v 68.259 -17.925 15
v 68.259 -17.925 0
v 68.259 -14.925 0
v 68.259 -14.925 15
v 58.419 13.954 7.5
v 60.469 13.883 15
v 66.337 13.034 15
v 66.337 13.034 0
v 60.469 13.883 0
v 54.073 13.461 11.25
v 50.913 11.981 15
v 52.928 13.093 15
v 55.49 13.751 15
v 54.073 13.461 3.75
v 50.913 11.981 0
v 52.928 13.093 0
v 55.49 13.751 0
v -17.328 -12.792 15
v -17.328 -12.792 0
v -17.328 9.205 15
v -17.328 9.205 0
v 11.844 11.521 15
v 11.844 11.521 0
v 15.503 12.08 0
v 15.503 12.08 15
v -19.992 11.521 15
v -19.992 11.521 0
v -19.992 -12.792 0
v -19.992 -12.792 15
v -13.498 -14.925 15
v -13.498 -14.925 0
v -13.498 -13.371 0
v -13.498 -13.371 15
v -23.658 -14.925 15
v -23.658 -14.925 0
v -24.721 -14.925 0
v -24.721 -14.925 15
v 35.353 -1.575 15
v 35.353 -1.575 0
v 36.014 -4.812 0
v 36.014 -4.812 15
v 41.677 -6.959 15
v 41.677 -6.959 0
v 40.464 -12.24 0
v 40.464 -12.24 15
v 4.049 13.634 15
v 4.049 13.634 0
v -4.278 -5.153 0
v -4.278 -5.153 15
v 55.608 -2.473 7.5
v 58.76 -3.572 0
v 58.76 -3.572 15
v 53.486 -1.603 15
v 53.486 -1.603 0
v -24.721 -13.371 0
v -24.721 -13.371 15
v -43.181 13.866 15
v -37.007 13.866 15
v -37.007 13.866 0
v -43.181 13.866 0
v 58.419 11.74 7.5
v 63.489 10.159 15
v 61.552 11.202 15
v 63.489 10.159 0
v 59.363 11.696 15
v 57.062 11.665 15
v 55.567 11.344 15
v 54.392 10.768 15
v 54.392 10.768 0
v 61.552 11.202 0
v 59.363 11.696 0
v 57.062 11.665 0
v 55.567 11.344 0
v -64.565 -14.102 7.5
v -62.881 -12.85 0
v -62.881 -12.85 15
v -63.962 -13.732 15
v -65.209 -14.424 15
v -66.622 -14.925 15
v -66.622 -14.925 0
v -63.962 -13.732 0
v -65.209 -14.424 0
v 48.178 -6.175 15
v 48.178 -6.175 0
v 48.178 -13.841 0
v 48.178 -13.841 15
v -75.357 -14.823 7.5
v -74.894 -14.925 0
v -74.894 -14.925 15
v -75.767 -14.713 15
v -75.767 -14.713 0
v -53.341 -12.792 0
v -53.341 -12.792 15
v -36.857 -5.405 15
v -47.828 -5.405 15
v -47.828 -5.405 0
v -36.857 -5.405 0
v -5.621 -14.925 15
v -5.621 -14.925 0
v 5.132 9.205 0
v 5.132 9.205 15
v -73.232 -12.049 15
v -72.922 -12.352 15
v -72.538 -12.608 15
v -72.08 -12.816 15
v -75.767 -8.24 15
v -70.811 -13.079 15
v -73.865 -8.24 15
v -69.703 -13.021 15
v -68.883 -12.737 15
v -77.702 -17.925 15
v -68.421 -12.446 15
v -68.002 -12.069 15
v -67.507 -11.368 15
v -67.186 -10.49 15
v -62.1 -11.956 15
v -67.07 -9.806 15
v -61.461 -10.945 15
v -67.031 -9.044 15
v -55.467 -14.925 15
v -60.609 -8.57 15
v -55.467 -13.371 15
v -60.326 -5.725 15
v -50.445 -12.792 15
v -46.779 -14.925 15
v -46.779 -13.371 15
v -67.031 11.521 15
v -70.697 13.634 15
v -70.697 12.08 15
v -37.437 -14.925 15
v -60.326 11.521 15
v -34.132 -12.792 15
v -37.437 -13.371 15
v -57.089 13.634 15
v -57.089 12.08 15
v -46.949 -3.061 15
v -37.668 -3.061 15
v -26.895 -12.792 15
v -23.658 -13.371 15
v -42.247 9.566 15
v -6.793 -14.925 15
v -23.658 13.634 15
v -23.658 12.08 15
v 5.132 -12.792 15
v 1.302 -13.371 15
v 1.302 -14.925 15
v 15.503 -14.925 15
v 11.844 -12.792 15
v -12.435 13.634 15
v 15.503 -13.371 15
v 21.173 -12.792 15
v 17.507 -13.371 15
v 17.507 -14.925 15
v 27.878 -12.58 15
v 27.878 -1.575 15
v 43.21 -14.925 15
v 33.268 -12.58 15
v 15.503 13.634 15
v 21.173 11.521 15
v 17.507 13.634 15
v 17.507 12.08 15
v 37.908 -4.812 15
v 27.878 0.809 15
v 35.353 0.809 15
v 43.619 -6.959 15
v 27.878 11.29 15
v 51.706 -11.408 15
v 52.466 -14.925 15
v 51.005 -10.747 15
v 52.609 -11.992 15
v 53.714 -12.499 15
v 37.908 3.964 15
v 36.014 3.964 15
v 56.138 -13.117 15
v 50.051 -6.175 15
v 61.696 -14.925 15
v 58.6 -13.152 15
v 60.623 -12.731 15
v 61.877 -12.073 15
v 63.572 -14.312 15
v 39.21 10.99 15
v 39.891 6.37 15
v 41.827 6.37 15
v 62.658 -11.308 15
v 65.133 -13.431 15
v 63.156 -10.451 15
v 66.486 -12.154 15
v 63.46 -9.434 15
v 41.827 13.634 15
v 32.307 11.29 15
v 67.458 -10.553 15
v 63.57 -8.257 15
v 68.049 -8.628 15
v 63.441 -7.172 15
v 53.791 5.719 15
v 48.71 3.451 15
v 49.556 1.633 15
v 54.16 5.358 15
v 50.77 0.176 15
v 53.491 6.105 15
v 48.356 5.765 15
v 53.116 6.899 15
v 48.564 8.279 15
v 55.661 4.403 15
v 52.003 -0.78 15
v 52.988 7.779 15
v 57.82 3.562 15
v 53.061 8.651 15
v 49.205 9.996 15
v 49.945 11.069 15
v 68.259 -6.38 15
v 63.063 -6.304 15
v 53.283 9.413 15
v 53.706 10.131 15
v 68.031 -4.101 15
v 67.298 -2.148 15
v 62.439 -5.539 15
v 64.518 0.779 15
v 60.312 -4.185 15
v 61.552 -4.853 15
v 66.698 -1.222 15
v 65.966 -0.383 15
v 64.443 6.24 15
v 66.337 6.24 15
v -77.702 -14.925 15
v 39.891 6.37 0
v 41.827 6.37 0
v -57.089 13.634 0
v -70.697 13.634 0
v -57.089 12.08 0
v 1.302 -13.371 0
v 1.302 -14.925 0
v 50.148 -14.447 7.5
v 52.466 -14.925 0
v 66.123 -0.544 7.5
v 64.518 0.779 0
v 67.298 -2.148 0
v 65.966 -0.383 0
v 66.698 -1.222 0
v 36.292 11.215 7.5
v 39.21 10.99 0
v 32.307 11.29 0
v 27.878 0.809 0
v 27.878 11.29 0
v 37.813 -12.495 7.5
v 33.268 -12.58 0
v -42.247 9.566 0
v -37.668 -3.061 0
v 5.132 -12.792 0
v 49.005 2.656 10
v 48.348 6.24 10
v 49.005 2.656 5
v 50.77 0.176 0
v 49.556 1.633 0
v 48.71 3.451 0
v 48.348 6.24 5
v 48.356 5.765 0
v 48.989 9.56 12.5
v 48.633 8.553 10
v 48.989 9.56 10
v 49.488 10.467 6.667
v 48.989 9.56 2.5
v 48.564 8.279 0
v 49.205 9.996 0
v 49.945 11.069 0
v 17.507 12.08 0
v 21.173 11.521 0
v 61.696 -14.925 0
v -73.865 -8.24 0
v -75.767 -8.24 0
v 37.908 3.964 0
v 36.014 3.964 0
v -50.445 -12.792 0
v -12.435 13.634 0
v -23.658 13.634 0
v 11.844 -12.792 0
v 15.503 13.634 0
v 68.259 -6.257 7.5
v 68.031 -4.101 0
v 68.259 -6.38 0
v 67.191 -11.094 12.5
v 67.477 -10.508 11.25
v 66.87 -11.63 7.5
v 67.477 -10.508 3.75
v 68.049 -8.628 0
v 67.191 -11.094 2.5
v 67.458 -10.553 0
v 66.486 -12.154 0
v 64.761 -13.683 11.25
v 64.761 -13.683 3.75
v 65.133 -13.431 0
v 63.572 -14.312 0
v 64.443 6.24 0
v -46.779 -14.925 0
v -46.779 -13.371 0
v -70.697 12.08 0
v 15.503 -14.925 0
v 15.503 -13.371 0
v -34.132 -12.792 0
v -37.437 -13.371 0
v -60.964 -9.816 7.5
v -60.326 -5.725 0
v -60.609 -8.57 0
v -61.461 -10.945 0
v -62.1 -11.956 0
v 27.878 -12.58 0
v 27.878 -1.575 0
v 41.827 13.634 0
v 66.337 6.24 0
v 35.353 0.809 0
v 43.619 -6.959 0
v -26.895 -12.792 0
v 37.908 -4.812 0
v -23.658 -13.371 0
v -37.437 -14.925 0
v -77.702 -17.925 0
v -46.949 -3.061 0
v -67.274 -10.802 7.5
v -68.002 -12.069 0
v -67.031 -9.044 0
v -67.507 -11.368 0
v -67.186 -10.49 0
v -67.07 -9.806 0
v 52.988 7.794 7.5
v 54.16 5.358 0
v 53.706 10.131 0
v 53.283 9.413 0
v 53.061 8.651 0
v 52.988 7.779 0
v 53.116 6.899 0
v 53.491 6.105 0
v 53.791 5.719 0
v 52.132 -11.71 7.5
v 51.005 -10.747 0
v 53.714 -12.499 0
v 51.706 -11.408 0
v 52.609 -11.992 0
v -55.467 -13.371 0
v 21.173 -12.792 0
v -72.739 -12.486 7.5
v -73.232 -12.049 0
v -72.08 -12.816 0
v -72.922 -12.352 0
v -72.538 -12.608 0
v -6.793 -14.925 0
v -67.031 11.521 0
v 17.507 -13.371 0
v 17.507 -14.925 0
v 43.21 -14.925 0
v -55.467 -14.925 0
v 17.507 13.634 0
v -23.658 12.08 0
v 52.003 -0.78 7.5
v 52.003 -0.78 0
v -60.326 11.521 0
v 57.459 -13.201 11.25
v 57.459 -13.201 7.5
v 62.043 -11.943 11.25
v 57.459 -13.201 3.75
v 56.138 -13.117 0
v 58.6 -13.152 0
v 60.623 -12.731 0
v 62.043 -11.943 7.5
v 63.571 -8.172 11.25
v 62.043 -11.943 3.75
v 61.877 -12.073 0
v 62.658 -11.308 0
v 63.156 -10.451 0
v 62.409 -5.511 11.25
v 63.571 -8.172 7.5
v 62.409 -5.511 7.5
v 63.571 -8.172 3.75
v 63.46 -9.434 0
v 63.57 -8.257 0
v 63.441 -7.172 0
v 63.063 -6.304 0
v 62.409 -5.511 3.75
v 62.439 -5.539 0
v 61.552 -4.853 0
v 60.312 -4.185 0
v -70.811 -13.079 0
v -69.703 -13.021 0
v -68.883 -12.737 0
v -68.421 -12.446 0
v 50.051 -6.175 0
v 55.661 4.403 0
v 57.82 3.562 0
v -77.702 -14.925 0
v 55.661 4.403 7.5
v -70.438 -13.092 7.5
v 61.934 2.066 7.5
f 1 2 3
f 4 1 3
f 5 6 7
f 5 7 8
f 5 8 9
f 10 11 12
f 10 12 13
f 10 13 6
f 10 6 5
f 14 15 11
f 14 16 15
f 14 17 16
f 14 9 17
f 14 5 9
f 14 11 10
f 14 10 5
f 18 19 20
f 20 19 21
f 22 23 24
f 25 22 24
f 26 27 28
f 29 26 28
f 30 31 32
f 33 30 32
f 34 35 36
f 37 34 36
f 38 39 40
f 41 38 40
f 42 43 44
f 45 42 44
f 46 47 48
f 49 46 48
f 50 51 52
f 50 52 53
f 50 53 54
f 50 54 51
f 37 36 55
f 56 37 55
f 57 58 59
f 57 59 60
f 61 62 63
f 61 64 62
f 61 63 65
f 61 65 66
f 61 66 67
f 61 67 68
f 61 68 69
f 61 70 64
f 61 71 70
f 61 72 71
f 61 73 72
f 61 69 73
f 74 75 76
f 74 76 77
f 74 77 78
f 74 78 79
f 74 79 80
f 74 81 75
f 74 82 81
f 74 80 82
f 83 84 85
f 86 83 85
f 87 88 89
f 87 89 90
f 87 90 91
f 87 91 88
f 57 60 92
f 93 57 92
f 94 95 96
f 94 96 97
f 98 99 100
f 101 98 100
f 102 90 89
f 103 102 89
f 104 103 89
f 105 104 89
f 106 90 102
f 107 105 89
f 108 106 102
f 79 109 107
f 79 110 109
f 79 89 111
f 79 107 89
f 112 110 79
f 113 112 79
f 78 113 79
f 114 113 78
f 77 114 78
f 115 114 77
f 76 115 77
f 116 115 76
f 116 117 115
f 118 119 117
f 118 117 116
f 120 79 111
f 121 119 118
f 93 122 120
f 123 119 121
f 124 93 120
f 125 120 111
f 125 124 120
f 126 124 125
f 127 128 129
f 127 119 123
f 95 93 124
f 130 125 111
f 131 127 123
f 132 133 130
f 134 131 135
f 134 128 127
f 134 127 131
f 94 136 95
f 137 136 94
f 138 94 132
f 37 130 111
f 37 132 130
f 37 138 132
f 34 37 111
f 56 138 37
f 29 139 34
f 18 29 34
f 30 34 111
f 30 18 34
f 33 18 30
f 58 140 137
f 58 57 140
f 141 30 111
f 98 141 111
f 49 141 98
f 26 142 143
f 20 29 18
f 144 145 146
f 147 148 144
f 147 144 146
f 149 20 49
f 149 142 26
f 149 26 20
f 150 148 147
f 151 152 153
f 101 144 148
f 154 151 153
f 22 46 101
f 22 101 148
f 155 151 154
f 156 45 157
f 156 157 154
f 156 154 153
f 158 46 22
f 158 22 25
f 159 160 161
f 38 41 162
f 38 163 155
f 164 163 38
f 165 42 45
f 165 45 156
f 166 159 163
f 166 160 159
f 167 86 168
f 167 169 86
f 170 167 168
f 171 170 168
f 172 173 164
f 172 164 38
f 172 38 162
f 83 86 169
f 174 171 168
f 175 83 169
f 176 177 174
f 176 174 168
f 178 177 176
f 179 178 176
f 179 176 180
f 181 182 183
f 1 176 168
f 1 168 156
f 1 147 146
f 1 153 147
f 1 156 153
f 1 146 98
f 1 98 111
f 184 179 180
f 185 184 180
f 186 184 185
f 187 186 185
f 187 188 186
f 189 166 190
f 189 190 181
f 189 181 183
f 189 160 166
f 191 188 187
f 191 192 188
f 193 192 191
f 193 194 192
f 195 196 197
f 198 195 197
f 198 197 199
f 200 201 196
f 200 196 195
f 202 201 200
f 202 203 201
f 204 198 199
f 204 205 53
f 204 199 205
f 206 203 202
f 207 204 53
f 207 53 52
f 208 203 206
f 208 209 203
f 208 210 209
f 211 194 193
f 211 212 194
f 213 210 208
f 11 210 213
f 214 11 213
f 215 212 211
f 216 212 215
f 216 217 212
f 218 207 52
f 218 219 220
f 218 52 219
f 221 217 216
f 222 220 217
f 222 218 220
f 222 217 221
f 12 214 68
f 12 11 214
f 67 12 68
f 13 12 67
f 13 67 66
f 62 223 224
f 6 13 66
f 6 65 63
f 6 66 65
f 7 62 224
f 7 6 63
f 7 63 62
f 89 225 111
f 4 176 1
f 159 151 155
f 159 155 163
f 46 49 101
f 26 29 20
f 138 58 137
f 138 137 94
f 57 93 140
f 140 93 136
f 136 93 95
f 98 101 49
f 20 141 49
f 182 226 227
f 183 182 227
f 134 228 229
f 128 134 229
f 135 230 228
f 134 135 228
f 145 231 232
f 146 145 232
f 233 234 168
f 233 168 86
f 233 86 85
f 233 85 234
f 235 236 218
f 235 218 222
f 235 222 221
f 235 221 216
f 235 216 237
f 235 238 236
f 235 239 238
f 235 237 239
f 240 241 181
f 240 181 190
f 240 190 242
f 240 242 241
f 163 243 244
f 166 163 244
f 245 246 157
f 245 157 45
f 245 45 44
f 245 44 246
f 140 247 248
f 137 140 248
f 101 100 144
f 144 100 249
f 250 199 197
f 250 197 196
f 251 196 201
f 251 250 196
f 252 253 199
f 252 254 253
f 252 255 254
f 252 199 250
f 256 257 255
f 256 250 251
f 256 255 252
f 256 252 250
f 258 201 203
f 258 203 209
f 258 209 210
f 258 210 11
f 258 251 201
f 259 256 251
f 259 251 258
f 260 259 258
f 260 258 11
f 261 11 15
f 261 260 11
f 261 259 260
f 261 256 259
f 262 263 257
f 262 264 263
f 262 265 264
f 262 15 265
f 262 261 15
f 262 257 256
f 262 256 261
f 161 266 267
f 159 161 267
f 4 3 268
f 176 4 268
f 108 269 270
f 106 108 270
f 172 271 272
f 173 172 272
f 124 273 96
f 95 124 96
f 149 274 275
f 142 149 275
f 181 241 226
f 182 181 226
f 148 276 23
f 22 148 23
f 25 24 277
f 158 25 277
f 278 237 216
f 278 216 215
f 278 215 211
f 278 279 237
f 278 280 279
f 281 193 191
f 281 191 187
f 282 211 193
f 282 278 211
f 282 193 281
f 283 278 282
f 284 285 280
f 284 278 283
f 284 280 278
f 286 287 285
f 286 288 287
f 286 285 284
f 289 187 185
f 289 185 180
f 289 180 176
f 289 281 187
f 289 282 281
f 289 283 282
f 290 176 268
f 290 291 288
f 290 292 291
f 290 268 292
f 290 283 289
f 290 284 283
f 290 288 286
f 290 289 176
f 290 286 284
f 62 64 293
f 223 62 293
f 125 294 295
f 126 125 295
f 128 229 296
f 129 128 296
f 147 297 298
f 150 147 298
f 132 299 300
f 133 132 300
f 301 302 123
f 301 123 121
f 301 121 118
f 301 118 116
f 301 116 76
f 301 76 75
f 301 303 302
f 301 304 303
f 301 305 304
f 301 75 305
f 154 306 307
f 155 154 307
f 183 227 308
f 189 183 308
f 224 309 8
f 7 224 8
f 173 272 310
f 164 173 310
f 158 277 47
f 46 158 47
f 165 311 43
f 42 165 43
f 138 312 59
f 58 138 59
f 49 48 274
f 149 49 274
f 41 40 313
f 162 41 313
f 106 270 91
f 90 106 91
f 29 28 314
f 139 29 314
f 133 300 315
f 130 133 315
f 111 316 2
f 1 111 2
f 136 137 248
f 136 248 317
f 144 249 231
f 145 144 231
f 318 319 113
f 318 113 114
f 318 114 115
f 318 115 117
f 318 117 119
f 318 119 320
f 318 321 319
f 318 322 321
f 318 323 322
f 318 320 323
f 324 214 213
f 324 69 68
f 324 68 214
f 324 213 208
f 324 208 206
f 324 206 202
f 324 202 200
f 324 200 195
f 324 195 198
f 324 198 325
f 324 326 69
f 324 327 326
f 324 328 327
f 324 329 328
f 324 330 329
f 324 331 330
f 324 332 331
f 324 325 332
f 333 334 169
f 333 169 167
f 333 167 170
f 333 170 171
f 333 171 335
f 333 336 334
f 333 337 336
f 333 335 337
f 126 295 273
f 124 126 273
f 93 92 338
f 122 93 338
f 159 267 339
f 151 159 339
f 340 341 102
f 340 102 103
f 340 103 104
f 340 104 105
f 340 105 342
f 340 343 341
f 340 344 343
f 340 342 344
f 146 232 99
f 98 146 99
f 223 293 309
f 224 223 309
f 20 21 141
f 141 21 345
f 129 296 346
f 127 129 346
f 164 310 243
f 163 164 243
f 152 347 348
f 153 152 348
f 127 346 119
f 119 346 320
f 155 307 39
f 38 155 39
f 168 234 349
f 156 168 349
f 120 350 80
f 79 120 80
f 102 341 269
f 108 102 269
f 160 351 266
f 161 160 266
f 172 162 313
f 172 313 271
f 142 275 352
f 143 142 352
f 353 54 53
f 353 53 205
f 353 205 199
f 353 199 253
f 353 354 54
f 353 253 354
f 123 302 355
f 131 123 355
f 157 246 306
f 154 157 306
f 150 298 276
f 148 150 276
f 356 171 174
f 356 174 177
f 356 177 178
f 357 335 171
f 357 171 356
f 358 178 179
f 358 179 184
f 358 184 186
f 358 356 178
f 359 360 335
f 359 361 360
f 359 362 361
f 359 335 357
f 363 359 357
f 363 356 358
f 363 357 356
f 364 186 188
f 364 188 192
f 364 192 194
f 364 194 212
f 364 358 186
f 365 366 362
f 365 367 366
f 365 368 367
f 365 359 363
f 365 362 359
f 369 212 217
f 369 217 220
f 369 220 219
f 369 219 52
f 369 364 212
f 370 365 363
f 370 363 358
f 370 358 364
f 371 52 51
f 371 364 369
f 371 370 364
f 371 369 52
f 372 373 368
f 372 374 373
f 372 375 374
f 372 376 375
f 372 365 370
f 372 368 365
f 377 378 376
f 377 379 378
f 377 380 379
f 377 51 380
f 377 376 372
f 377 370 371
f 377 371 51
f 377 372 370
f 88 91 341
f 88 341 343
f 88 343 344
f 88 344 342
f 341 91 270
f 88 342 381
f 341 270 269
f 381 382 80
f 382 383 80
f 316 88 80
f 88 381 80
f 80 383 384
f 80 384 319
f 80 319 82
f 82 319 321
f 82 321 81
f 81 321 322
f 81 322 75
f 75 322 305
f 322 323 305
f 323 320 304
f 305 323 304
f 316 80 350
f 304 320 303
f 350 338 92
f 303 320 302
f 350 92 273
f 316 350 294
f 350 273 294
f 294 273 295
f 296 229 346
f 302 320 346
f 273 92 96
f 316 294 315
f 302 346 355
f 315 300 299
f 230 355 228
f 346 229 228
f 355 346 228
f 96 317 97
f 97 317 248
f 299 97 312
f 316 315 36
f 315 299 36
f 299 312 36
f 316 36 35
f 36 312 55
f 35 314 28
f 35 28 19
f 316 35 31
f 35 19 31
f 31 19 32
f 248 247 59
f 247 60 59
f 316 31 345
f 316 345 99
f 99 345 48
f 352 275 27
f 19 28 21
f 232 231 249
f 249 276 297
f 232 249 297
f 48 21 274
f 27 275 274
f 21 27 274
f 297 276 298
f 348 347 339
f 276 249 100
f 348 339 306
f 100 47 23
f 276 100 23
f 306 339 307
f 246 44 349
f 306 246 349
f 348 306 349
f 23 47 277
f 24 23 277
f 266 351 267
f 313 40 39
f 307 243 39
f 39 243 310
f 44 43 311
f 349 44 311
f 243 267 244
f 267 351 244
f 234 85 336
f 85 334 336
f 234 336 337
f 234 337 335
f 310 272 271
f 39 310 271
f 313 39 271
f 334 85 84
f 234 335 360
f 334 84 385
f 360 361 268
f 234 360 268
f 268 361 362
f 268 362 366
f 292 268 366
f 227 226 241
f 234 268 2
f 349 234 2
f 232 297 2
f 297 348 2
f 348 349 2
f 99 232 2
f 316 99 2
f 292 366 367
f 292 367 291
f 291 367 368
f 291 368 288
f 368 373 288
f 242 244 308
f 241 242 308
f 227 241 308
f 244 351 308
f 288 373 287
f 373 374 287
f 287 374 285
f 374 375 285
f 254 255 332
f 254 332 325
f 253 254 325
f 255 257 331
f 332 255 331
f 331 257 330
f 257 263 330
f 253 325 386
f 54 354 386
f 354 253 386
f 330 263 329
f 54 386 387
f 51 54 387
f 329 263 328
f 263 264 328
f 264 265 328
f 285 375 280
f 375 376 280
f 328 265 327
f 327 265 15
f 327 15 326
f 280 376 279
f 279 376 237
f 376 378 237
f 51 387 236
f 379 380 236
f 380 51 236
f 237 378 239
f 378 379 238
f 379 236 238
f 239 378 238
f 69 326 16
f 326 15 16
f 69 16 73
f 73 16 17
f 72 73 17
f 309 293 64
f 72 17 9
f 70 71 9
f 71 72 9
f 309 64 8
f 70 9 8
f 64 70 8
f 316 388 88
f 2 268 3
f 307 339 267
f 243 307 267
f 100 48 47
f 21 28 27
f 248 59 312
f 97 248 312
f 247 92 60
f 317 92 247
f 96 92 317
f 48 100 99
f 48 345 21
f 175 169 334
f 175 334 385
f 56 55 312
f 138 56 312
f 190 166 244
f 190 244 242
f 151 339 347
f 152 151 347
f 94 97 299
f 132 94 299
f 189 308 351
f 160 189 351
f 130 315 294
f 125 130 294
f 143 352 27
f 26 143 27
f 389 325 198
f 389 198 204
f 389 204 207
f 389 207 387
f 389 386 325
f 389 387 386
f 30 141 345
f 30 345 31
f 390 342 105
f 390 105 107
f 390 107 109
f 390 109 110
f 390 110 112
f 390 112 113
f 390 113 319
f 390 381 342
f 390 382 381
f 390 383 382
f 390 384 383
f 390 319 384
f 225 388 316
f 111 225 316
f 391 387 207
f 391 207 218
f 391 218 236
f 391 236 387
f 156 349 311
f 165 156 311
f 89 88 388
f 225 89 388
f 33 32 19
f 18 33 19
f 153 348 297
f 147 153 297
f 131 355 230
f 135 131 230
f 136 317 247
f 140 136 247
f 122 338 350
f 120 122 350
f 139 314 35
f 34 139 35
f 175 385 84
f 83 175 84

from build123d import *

# Parameters (mm, degrees)
F1_DEPTH = 15


with BuildPart() as f1:
    # F0 (on Top) → F1 (new body)
    with BuildSketch(Plane.XY):
        Polygon((-55.4669993083, -13.3709355081), (-55.4669993083, -14.9245814085), (-46.7788478918, -14.9245814085), (-46.7788478918, -13.3709355081), (-50.4449070777, -12.7917254137), (-47.8282402981, -5.4050931505), (-36.8573196859, -5.4050931505), (-34.1316251238, -12.7917254137), (-37.4365297803, -13.3709355081), (-37.4365297803, -14.9245814085), (-24.7211646484, -14.9245814085), (-24.7211646484, -13.3709355081), (-26.8949060616, -12.7917254137), (-37.0072328868, 13.8655674032), (-43.1809310698, 13.8655674032), (-53.3409575499, -12.7917254137), align=None)
        Polygon((-46.9492038019, -3.0609958272), (-42.2473806823, 9.5657842315), (-37.6682138181, -3.0609958272), align=None, mode=Mode.SUBTRACT)
        with BuildLine():
            Line((-46.7788478918, -14.9245814085), (-55.4669993083, -14.9245814085))
            Line((-55.4669993083, -14.9245814085), (-66.6218982829, -14.9245814085))
            add(Edge.make_bspline(
                [(-66.6218982829, -14.9245814085), (-68.2072820659, -15.353878302), (-70.1653072341, -15.353878302)],
                knots=[0.5859606644, 0.5859606644, 0.5859606644, 1, 1, 1], degree=2))
            add(Edge.make_bspline(
                [(-70.1653072341, -15.353878302), (-71.7598385529, -15.353878302), (-73.3032630987, -15.1698939191)],
                knots=[0, 0, 0, 1, 1, 1], degree=2))
            add(Edge.make_bspline(
                [(-73.3032630987, -15.1698939191), (-74.2052983154, -15.0623665423), (-74.8943654736, -14.9245814085)],
                knots=[0, 0, 0, 0.5844375218, 0.5844375218, 0.5844375218], degree=2))
            Line((-74.8943654736, -14.9245814085), (-77.7018526982, -14.9245814085))
            Line((-77.7018526982, -14.9245814085), (-77.7018526982, -17.9245814085))
            Line((-77.7018526982, -17.9245814085), (68.2590910996, -17.9245814085))
            Line((68.2590910996, -17.9245814085), (68.2590910996, -14.9245814085))
            Line((68.2590910996, -14.9245814085), (61.695634433, -14.9245814085))
            add(Edge.make_bspline(
                [(61.695634433, -14.9245814085), (59.8741275274, -15.353878302), (57.5471114707, -15.353878302)],
                knots=[0.7827650782, 0.7827650782, 0.7827650782, 1, 1, 1], degree=2))
            add(Edge.make_bspline(
                [(57.5471114707, -15.353878302), (55.0939863649, -15.353878302), (52.5488690676, -14.9382098813)],
                knots=[0, 0, 0, 1, 1, 1], degree=2))
            add(Edge.make_bspline(
                [(52.5488690676, -14.9382098813), (52.5073622228, -14.9314309856), (52.4660465805, -14.9245814085)],
                knots=[0, 0, 0, 0.0163084212, 0.0163084212, 0.0163084212], degree=2))
            Line((52.4660465805, -14.9245814085), (43.2099580743, -14.9245814085))
            Line((43.2099580743, -14.9245814085), (17.5066583542, -14.9245814085))
            Line((17.5066583542, -14.9245814085), (15.5032728511, -14.9245814085))
            Line((15.5032728511, -14.9245814085), (1.3024041828, -14.9245814085))
            Line((1.3024041828, -14.9245814085), (-5.6208600048, -14.9245814085))
            Line((-5.6208600048, -14.9245814085), (-6.7929086665, -14.9245814085))
            Line((-6.7929086665, -14.9245814085), (-13.4981172891, -14.9245814085))
            Line((-13.4981172891, -14.9245814085), (-23.6581437692, -14.9245814085))
            Line((-23.6581437692, -14.9245814085), (-24.7211646484, -14.9245814085))
            Line((-24.7211646484, -14.9245814085), (-37.4365297803, -14.9245814085))
            Line((-37.4365297803, -14.9245814085), (-46.7788478918, -14.9245814085))
        make_face()
        with BuildLine():
            add(Edge.make_bspline(
                [(-66.6218982829, -14.9245814085), (-68.2072820659, -15.353878302), (-70.1653072341, -15.353878302)],
                knots=[0.5859606644, 0.5859606644, 0.5859606644, 1, 1, 1], degree=2))
            Line((-66.6218982829, -14.9245814085), (-74.8943654736, -14.9245814085))
            add(Edge.make_bspline(
                [(-73.3032630987, -15.1698939191), (-74.2052983154, -15.0623665423), (-74.8943654736, -14.9245814085)],
                knots=[0, 0, 0, 0.5844375218, 0.5844375218, 0.5844375218], degree=2))
            add(Edge.make_bspline(
                [(-70.1653072341, -15.353878302), (-71.7598385529, -15.353878302), (-73.3032630987, -15.1698939191)],
                knots=[0, 0, 0, 1, 1, 1], degree=2))
        make_face()
        with BuildLine():
            Line((-74.8943654736, -14.9245814085), (-66.6218982829, -14.9245814085))
            add(Edge.make_bspline(
                [(-62.8808885171, -12.8496464231), (-64.3782164513, -14.3170277987), (-66.6218982829, -14.9245814085)],
                knots=[0, 0, 0, 0.5859606644, 0.5859606644, 0.5859606644], degree=2))
            add(Edge.make_bspline(
                [(-60.3255498651, -5.7253622616), (-60.3255498651, -10.3454145443), (-62.8808885171, -12.8496464231)],
                knots=[0, 0, 0, 1, 1, 1], degree=2))
            Line((-60.3255498651, -5.7253622616), (-60.3255498651, 11.5214700798))
            Line((-60.3255498651, 11.5214700798), (-57.0887875727, 12.080237465))
            Line((-57.0887875727, 12.080237465), (-57.0887875727, 13.6338833654))
            Line((-57.0887875727, 13.6338833654), (-70.6968176737, 13.6338833654))
            Line((-70.6968176737, 13.6338833654), (-70.6968176737, 12.080237465))
            Line((-70.6968176737, 12.080237465), (-67.0307584878, 11.5214700798))
            Line((-67.0307584878, 11.5214700798), (-67.0307584878, -9.0438953909))
            add(Edge.make_bspline(
                [(-68.0017871755, -12.0694163548), (-67.0307584878, -11.047280894), (-67.0307584878, -9.0438953909)],
                knots=[0, 0, 0, 1, 1, 1], degree=2))
            add(Edge.make_bspline(
                [(-70.4378766904, -13.0915518155), (-68.9728158632, -13.0915518155), (-68.0017871755, -12.0694163548)],
                knots=[0, 0, 0, 1, 1, 1], degree=2))
            add(Edge.make_bspline(
                [(-72.080107664, -12.8155752411), (-71.3373558958, -13.0915518155), (-70.4378766904, -13.0915518155)],
                knots=[0, 0, 0, 1, 1, 1], degree=2))
            add(Edge.make_bspline(
                [(-73.2317136165, -12.0489736455), (-72.8228594321, -12.5395986667), (-72.080107664, -12.8155752411)],
                knots=[0, 0, 0, 1, 1, 1], degree=2))
            Line((-73.2317136165, -12.0489736455), (-73.8654376021, -8.2398154951))
            Line((-73.8654376021, -8.2398154951), (-75.7666095592, -8.2398154951))
            Line((-75.7666095592, -8.2398154951), (-75.7666095592, -14.7133400799))
            add(Edge.make_bspline(
                [(-74.8943654736, -14.9245814085), (-75.3843245286, -14.8266097186), (-75.7666095592, -14.7133400799)],
                knots=[0.5844375218, 0.5844375218, 0.5844375218, 1, 1, 1], degree=2))
        make_face()
        Polygon((-23.6581437692, -13.3709355081), (-23.6581437692, -14.9245814085), (-13.4981172891, -14.9245814085), (-13.4981172891, -13.3709355081), (-17.3277181488, -12.7917254137), (-17.3277181488, 9.2046297021), (-6.7929086665, -14.9245814085), (-5.6208600048, -14.9245814085), (5.1320050425, 9.2046297021), (5.1320050425, -12.7917254137), (1.3024041828, -13.3709355081), (1.3024041828, -14.9245814085), (15.5032728511, -14.9245814085), (15.5032728511, -13.3709355081), (11.8440279016, -12.7917254137), (11.8440279016, 11.5214700798), (15.5032728511, 12.080237465), (15.5032728511, 13.6338833654), (4.0485414541, 13.6338833654), (-4.278455433, -5.1529664035), (-12.4350964099, 13.6338833654), (-23.6581437692, 13.6338833654), (-23.6581437692, 12.080237465), (-19.9920845832, 11.5214700798), (-19.9920845832, -12.7917254137), align=None)
        with BuildLine():
            add(Edge.make_bspline(
                [(61.695634433, -14.9245814085), (59.8741275274, -15.353878302), (57.5471114707, -15.353878302)],
                knots=[0.7827650782, 0.7827650782, 0.7827650782, 1, 1, 1], degree=2))
            Line((61.695634433, -14.9245814085), (52.4660465805, -14.9245814085))
            add(Edge.make_bspline(
                [(52.5488690676, -14.9382098813), (52.5073622228, -14.9314309856), (52.4660465805, -14.9245814085)],
                knots=[0, 0, 0, 0.0163084212, 0.0163084212, 0.0163084212], degree=2))
            add(Edge.make_bspline(
                [(57.5471114707, -15.353878302), (55.0939863649, -15.353878302), (52.5488690676, -14.9382098813)],
                knots=[0, 0, 0, 1, 1, 1], degree=2))
        make_face()
        with BuildLine():
            Line((52.4660465805, -14.9245814085), (61.695634433, -14.9245814085))
            add(Edge.make_bspline(
                [(68.2590910996, -6.2568727012), (68.2590910996, -13.377691002), (61.695634433, -14.9245814085)],
                knots=[0, 0, 0, 0.7827650782, 0.7827650782, 0.7827650782], degree=2))
            add(Edge.make_bspline(
                [(67.2982837665, -2.1478881489), (68.2590910996, -3.8923326686), (68.2590910996, -6.2568727012)],
                knots=[0, 0, 0, 1, 1, 1], degree=2))
            add(Edge.make_bspline(
                [(64.5180753132, 0.7788263871), (66.3374764333, -0.4034436292), (67.2982837665, -2.1478881489)],
                knots=[0, 0, 0, 1, 1, 1], degree=2))
            add(Edge.make_bspline(
                [(57.8196809269, 3.5624419586), (62.698674193, 1.9610964034), (64.5180753132, 0.7788263871)],
                knots=[0, 0, 0, 1, 1, 1], degree=2))
            add(Edge.make_bspline(
                [(54.1604359774, 5.3579932514), (55.3324846391, 4.3460791452), (57.8196809269, 3.5624419586)],
                knots=[0, 0, 0, 1, 1, 1], degree=2))
            add(Edge.make_bspline(
                [(52.9883873157, 7.7940827662), (52.9883873157, 6.3699073575), (54.1604359774, 5.3579932514)],
                knots=[0, 0, 0, 1, 1, 1], degree=2))
            add(Edge.make_bspline(
                [(54.3921200152, 10.768496957), (52.9883873157, 9.7974682693), (52.9883873157, 7.7940827662)],
                knots=[0, 0, 0, 1, 1, 1], degree=2))
            add(Edge.make_bspline(
                [(58.4193337306, 11.7395256448), (55.7958527146, 11.7395256448), (54.3921200152, 10.768496957)],
                knots=[0, 0, 0, 1, 1, 1], degree=2))
            add(Edge.make_bspline(
                [(63.489125616, 10.1586227988), (61.3153842028, 11.7395256448), (58.4193337306, 11.7395256448)],
                knots=[0, 0, 0, 1, 1, 1], degree=2))
            Line((63.489125616, 10.1586227988), (64.4431187127, 6.2404368658))
            Line((64.4431187127, 6.2404368658), (66.3374764333, 6.2404368658))
            Line((66.3374764333, 6.2404368658), (66.3374764333, 13.0342305617))
            add(Edge.make_bspline(
                [(58.4193337306, 13.9541524764), (61.9968078433, 13.9541524764), (66.3374764333, 13.0342305617)],
                knots=[0, 0, 0, 1, 1, 1], degree=2))
            add(Edge.make_bspline(
                [(50.9134523303, 11.9814310371), (53.4790123369, 13.9541524764), (58.4193337306, 13.9541524764)],
                knots=[0, 0, 0, 1, 1, 1], degree=2))
            add(Edge.make_bspline(
                [(48.3478923238, 6.2404368658), (48.3478923238, 10.0087095979), (50.9134523303, 11.9814310371)],
                knots=[0, 0, 0, 1, 1, 1], degree=2))
            add(Edge.make_bspline(
                [(49.0054661369, 2.6561485167), (48.3478923238, 4.1143951074), (48.3478923238, 6.2404368658)],
                knots=[0, 0, 0, 1, 1, 1], degree=2))
            add(Edge.make_bspline(
                [(50.7703533658, 0.1757664653), (49.66303995, 1.197901926), (49.0054661369, 2.6561485167)],
                knots=[0, 0, 0, 1, 1, 1], degree=2))
            add(Edge.make_bspline(
                [(53.4858265733, -1.6027492365), (51.8776667817, -0.8463689955), (50.7703533658, 0.1757664653)],
                knots=[0, 0, 0, 1, 1, 1], degree=2))
            add(Edge.make_bspline(
                [(58.7600455508, -3.5720635576), (55.0939863649, -2.3591294774), (53.4858265733, -1.6027492365)],
                knots=[0, 0, 0, 1, 1, 1], degree=2))
            add(Edge.make_bspline(
                [(62.4090691458, -5.5107138148), (61.2472418387, -4.4238431082), (58.7600455508, -3.5720635576)],
                knots=[0, 0, 0, 1, 1, 1], degree=2))
            add(Edge.make_bspline(
                [(63.5708964529, -8.171673131), (63.5708964529, -6.5975845214), (62.4090691458, -5.5107138148)],
                knots=[0, 0, 0, 1, 1, 1], degree=2))
            add(Edge.make_bspline(
                [(57.4585263975, -13.200579598), (63.5708964529, -13.200579598), (63.5708964529, -8.171673131)],
                knots=[0, 0, 0, 1, 1, 1], degree=2))
            add(Edge.make_bspline(
                [(53.7141034929, -12.4987132483), (55.5232832584, -13.200579598), (57.4585263975, -13.200579598)],
                knots=[0, 0, 0, 1, 1, 1], degree=2))
            add(Edge.make_bspline(
                [(51.0054445218, -10.7474544922), (51.9049237273, -11.7968468985), (53.7141034929, -12.4987132483)],
                knots=[0, 0, 0, 1, 1, 1], degree=2))
            Line((51.0054445218, -10.7474544922), (50.0514514251, -6.1751018643))
            Line((50.0514514251, -6.1751018643), (48.1775364137, -6.1751018643))
            Line((48.1775364137, -6.1751018643), (48.1775364137, -13.8411178201))
            add(Edge.make_bspline(
                [(52.4660465805, -14.9245814085), (49.9739690811, -14.5114285169), (48.1775364137, -13.8411178201)],
                knots=[0.0163084212, 0.0163084212, 0.0163084212, 1, 1, 1], degree=2))
        make_face()
        with BuildLine():
            Line((17.5066583542, -14.9245814085), (43.2099580743, -14.9245814085))
            Line((43.2099580743, -14.9245814085), (43.6188122587, -6.9587390509))
            Line((43.6188122587, -6.9587390509), (41.6767548832, -6.9587390509))
            Line((41.6767548832, -6.9587390509), (40.4638208031, -12.2397722649))
            add(Edge.make_bspline(
                [(33.2679871593, -12.5804840851), (38.7602617018, -12.5804840851), (40.4638208031, -12.2397722649)],
                knots=[0, 0, 0, 1, 1, 1], degree=2))
            Line((33.2679871593, -12.5804840851), (27.8779261628, -12.5804840851))
            Line((27.8779261628, -12.5804840851), (27.8779261628, -1.5754922909))
            Line((27.8779261628, -1.5754922909), (35.3531434992, -1.5754922909))
            Line((35.3531434992, -1.5754922909), (36.0141244305, -4.8122545833))
            Line((36.0141244305, -4.8122545833), (37.9084821512, -4.8122545833))
            Line((37.9084821512, -4.8122545833), (37.9084821512, 3.9644819065))
            Line((37.9084821512, 3.9644819065), (36.0141244305, 3.9644819065))
            Line((36.0141244305, 3.9644819065), (35.3531434992, 0.8094904509))
            Line((35.3531434992, 0.8094904509), (27.8779261628, 0.8094904509))
            Line((27.8779261628, 0.8094904509), (27.8779261628, 11.289786042))
            Line((27.8779261628, 11.289786042), (32.3071798261, 11.289786042))
            add(Edge.make_bspline(
                [(39.2100013045, 10.9899596402), (36.8250185627, 11.289786042), (32.3071798261, 11.289786042)],
                knots=[0, 0, 0, 1, 1, 1], degree=2))
            Line((39.2100013045, 10.9899596402), (39.8914249451, 6.3699073575))
            Line((39.8914249451, 6.3699073575), (41.8266680841, 6.3699073575))
            Line((41.8266680841, 6.3699073575), (41.8266680841, 13.6338833654))
            Line((41.8266680841, 13.6338833654), (17.5066583542, 13.6338833654))
            Line((17.5066583542, 13.6338833654), (17.5066583542, 12.080237465))
            Line((17.5066583542, 12.080237465), (21.1727175402, 11.5214700798))
            Line((21.1727175402, 11.5214700798), (21.1727175402, -12.7917254137))
            Line((21.1727175402, -12.7917254137), (17.5066583542, -13.3709355081))
            Line((17.5066583542, -13.3709355081), (17.5066583542, -14.9245814085))
        make_face()
    extrude(amount=F1_DEPTH)


solid = f1.part
